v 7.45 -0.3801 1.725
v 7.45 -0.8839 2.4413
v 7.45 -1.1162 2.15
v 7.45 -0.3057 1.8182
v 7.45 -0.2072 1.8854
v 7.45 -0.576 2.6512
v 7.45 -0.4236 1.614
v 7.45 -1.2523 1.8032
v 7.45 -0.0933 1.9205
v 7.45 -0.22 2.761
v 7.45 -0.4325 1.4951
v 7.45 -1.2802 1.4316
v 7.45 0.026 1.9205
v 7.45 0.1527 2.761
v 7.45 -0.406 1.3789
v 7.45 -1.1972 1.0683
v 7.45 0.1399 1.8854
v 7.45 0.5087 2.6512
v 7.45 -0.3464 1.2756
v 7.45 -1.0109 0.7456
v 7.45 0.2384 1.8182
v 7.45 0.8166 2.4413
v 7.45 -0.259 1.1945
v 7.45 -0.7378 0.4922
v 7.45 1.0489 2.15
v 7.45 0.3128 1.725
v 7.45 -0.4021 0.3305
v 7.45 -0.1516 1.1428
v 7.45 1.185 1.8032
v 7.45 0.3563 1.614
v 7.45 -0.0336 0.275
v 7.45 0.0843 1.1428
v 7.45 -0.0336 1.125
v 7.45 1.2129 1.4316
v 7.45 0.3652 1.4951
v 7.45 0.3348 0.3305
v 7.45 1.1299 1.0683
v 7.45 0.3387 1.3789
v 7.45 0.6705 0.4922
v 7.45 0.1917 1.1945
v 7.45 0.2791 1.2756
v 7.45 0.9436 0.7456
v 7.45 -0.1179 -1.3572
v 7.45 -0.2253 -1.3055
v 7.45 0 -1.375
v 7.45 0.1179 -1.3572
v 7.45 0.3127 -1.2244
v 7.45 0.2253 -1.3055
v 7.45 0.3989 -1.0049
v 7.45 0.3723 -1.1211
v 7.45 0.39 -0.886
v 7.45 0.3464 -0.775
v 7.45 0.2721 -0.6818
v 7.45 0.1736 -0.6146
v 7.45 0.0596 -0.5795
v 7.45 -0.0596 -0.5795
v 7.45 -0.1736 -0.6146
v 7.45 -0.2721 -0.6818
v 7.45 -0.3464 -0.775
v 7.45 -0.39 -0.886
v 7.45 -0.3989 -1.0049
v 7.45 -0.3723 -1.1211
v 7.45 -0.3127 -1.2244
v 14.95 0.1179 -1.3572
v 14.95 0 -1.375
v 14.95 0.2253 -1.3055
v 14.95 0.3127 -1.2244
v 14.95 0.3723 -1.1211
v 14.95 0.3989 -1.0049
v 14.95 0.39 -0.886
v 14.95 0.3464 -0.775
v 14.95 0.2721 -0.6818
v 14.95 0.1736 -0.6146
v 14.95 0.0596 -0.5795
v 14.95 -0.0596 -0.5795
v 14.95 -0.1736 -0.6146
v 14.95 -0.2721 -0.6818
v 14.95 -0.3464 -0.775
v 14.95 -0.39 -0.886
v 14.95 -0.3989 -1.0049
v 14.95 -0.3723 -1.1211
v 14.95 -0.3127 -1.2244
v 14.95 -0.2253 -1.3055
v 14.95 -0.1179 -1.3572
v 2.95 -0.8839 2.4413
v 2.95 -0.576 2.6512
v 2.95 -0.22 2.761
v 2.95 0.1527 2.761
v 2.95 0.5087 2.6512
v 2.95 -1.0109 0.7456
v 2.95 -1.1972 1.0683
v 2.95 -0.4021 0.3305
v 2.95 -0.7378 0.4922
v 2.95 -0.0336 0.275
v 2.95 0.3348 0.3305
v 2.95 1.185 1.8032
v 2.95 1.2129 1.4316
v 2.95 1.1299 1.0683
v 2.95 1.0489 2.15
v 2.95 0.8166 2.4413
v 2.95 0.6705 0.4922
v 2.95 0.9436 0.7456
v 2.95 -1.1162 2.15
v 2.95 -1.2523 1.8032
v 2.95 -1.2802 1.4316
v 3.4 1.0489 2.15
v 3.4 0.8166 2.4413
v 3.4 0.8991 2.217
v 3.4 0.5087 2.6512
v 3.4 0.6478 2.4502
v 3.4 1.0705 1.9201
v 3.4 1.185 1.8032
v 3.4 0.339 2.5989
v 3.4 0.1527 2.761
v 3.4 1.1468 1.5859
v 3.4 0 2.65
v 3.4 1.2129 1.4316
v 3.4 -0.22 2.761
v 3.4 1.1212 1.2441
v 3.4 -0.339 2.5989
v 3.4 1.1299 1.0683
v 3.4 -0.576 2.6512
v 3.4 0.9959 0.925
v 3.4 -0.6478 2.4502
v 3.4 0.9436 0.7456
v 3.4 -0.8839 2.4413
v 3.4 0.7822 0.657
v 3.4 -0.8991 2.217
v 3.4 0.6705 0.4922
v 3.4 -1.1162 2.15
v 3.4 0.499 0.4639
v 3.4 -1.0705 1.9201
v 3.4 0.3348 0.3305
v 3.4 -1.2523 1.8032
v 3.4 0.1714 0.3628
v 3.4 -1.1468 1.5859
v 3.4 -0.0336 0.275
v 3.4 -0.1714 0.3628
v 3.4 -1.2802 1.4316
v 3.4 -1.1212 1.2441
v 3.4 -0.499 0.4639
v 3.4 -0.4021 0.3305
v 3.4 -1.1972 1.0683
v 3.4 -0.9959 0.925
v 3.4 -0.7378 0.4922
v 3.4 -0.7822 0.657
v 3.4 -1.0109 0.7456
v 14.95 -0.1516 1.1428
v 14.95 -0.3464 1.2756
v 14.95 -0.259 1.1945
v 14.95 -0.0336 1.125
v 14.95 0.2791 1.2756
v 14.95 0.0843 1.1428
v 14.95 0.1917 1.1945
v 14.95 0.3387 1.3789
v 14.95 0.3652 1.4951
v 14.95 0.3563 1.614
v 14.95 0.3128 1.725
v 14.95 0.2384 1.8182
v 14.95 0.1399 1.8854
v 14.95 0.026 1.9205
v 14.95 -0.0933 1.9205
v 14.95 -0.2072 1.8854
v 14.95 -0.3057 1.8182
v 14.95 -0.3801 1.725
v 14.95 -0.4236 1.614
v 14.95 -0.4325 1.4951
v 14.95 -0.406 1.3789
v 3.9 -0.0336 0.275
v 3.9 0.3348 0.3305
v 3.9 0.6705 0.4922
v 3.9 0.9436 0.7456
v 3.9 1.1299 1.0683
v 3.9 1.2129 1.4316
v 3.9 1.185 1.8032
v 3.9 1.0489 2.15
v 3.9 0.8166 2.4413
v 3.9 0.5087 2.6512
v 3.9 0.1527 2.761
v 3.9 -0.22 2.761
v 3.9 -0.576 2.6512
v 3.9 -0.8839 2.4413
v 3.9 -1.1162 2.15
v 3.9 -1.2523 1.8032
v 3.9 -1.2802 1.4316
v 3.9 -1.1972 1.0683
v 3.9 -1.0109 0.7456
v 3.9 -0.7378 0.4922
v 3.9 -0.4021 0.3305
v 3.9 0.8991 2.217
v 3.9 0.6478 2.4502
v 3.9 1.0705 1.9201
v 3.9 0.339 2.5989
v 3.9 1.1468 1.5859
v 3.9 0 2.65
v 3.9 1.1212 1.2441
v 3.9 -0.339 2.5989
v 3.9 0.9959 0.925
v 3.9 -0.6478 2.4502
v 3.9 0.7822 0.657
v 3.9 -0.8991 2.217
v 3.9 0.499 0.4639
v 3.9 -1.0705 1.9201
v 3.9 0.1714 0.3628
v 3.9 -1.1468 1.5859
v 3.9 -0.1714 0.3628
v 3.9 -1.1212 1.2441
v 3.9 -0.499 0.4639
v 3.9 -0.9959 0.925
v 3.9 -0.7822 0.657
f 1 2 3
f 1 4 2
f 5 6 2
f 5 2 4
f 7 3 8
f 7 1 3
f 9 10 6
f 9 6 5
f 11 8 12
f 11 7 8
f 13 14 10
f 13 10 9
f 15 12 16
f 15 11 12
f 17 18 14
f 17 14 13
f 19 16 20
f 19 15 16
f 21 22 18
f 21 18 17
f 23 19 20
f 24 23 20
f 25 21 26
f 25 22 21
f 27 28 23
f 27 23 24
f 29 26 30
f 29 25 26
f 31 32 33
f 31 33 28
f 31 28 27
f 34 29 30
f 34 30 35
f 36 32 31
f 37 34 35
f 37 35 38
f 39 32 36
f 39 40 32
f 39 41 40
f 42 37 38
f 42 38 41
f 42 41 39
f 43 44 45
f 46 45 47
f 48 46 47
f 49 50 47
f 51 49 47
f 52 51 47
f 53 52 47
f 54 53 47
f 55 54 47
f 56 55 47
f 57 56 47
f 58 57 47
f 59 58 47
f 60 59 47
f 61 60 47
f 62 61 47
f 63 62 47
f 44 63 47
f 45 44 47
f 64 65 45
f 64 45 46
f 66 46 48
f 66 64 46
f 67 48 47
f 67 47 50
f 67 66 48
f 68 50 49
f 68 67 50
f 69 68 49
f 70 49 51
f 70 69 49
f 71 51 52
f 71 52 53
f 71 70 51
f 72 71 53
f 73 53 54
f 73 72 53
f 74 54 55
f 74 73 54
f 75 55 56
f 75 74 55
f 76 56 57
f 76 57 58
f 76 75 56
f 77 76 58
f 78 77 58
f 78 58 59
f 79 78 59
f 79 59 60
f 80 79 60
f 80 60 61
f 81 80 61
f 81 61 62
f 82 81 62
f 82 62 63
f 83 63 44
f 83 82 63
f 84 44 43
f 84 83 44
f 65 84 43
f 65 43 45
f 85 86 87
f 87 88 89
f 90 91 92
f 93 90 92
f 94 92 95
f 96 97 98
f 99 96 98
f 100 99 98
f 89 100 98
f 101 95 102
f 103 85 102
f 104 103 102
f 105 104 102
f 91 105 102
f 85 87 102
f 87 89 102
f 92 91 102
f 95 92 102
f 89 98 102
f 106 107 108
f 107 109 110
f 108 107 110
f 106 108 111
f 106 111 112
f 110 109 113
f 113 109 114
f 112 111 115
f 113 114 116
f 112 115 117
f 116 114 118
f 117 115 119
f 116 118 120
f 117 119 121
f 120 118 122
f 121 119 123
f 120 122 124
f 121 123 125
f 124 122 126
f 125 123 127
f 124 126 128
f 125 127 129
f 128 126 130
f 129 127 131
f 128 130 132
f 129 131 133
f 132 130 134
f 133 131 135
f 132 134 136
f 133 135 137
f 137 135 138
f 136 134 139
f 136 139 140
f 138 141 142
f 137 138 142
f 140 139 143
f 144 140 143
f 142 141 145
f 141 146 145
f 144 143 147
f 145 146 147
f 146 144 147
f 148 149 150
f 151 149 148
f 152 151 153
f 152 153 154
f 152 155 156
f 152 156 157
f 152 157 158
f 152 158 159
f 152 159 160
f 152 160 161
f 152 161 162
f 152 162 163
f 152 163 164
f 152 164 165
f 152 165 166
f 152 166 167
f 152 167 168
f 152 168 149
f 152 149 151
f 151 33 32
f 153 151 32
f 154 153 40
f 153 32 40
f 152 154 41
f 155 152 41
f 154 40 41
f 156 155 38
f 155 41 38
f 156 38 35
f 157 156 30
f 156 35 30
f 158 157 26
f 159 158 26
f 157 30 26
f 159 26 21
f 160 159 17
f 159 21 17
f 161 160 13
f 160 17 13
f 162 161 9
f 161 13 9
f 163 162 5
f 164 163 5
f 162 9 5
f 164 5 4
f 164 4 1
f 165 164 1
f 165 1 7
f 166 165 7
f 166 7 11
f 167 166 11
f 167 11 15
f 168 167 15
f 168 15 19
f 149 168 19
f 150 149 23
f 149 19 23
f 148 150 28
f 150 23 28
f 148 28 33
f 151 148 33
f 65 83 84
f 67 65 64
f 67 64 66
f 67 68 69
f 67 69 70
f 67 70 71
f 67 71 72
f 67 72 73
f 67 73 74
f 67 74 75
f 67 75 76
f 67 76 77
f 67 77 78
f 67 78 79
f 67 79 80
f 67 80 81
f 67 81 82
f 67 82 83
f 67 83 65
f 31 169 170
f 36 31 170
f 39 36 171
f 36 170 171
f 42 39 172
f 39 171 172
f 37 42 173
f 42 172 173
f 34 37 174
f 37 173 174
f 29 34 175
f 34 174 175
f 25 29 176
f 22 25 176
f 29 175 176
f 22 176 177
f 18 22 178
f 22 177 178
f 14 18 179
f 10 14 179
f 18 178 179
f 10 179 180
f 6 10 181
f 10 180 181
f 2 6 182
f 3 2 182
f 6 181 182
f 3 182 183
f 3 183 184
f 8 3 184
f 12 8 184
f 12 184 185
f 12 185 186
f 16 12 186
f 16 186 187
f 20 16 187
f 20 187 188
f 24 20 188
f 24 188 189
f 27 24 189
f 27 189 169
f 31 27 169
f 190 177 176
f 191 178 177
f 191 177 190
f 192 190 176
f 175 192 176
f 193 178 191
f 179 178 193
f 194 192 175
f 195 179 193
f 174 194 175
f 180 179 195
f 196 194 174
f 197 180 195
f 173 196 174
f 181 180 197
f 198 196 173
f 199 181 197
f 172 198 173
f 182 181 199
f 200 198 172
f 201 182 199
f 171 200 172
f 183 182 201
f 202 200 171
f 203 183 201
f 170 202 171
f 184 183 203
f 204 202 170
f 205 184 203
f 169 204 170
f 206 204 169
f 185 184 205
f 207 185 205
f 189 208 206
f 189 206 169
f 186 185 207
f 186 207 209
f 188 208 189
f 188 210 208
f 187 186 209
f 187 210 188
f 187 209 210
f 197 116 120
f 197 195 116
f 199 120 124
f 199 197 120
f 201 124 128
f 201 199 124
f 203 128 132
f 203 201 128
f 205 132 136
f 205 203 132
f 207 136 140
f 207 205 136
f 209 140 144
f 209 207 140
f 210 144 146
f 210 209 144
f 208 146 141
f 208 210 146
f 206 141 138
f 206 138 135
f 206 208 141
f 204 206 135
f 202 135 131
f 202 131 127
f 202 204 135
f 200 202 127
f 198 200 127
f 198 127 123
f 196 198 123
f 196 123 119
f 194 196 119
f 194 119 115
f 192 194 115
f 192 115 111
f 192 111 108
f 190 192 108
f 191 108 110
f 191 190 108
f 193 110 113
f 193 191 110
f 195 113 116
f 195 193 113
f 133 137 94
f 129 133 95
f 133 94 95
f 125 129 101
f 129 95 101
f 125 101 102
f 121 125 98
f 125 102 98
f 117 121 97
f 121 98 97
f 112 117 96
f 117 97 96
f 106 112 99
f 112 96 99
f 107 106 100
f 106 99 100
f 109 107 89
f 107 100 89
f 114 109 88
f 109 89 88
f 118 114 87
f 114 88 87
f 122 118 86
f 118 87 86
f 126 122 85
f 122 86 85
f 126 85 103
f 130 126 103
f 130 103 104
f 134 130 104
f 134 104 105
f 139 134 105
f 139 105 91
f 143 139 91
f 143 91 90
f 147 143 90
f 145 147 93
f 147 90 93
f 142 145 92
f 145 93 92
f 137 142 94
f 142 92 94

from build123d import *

# Parameters (mm, degrees)
SKETCH_3_R      = 1.25
EXTRUDE_1_DEPTH = 4.5
SKETCH_4_W      = 0.5
SKETCH_4_H      = 0.5
SKETCH_7_R      = 0.4
EXTRUDE_3_DEPTH = 7.5
SKETCH_10_R     = 0.4
EXTRUDE_4_DEPTH = 7.5


with BuildPart() as part:
    # Эскиз3 → Вытянуть1 (new body)
    with BuildSketch(Plane(origin=(2.95, 0, 0), x_dir=(0, 0, -1), z_dir=(1, 0, 0))):
        with Locations((-1.525, -0.033649265)):
            Circle(SKETCH_3_R)
    extrude(amount=EXTRUDE_1_DEPTH)

    # Эскиз4 → Вырез-Повернуть1 (revolve, cut)
    with BuildSketch(Plane(origin=(0, 0, 0), x_dir=(1, 0, 0), z_dir=(0, 1, 0)), mode=Mode.PRIVATE) as cut_revolve_1_sk:
        with Locations((3.65, -0.1)):
            Rectangle(SKETCH_4_W, SKETCH_4_H)
    revolve(cut_revolve_1_sk.sketch.rotate(Axis((0, 0, 1.5), (1, 0, 0)), 180), axis=Axis((0, 0, 1.5), (1, 0, 0)), mode=Mode.SUBTRACT)

    # Эскиз7 → Вытянуть3 (add)
    with BuildSketch(Plane(origin=(7.45, 0, 0), x_dir=(0, 0, -1), z_dir=(1, 0, 0))):
        with Locations((-1.525, -0.033649265)):
            Circle(SKETCH_7_R)
    extrude(amount=EXTRUDE_3_DEPTH)


with BuildPart() as body_2:
    # Эскиз10 → Вытянуть4 (new body)
    with BuildSketch(Plane(origin=(14.95, 0, 0), x_dir=(0, 0, -1), z_dir=(1, 0, 0))):
        with Locations((0.975, 0)):
            Circle(SKETCH_10_R)
    extrude(amount=-EXTRUDE_4_DEPTH)


solid = Compound([part.part, body_2.part])
